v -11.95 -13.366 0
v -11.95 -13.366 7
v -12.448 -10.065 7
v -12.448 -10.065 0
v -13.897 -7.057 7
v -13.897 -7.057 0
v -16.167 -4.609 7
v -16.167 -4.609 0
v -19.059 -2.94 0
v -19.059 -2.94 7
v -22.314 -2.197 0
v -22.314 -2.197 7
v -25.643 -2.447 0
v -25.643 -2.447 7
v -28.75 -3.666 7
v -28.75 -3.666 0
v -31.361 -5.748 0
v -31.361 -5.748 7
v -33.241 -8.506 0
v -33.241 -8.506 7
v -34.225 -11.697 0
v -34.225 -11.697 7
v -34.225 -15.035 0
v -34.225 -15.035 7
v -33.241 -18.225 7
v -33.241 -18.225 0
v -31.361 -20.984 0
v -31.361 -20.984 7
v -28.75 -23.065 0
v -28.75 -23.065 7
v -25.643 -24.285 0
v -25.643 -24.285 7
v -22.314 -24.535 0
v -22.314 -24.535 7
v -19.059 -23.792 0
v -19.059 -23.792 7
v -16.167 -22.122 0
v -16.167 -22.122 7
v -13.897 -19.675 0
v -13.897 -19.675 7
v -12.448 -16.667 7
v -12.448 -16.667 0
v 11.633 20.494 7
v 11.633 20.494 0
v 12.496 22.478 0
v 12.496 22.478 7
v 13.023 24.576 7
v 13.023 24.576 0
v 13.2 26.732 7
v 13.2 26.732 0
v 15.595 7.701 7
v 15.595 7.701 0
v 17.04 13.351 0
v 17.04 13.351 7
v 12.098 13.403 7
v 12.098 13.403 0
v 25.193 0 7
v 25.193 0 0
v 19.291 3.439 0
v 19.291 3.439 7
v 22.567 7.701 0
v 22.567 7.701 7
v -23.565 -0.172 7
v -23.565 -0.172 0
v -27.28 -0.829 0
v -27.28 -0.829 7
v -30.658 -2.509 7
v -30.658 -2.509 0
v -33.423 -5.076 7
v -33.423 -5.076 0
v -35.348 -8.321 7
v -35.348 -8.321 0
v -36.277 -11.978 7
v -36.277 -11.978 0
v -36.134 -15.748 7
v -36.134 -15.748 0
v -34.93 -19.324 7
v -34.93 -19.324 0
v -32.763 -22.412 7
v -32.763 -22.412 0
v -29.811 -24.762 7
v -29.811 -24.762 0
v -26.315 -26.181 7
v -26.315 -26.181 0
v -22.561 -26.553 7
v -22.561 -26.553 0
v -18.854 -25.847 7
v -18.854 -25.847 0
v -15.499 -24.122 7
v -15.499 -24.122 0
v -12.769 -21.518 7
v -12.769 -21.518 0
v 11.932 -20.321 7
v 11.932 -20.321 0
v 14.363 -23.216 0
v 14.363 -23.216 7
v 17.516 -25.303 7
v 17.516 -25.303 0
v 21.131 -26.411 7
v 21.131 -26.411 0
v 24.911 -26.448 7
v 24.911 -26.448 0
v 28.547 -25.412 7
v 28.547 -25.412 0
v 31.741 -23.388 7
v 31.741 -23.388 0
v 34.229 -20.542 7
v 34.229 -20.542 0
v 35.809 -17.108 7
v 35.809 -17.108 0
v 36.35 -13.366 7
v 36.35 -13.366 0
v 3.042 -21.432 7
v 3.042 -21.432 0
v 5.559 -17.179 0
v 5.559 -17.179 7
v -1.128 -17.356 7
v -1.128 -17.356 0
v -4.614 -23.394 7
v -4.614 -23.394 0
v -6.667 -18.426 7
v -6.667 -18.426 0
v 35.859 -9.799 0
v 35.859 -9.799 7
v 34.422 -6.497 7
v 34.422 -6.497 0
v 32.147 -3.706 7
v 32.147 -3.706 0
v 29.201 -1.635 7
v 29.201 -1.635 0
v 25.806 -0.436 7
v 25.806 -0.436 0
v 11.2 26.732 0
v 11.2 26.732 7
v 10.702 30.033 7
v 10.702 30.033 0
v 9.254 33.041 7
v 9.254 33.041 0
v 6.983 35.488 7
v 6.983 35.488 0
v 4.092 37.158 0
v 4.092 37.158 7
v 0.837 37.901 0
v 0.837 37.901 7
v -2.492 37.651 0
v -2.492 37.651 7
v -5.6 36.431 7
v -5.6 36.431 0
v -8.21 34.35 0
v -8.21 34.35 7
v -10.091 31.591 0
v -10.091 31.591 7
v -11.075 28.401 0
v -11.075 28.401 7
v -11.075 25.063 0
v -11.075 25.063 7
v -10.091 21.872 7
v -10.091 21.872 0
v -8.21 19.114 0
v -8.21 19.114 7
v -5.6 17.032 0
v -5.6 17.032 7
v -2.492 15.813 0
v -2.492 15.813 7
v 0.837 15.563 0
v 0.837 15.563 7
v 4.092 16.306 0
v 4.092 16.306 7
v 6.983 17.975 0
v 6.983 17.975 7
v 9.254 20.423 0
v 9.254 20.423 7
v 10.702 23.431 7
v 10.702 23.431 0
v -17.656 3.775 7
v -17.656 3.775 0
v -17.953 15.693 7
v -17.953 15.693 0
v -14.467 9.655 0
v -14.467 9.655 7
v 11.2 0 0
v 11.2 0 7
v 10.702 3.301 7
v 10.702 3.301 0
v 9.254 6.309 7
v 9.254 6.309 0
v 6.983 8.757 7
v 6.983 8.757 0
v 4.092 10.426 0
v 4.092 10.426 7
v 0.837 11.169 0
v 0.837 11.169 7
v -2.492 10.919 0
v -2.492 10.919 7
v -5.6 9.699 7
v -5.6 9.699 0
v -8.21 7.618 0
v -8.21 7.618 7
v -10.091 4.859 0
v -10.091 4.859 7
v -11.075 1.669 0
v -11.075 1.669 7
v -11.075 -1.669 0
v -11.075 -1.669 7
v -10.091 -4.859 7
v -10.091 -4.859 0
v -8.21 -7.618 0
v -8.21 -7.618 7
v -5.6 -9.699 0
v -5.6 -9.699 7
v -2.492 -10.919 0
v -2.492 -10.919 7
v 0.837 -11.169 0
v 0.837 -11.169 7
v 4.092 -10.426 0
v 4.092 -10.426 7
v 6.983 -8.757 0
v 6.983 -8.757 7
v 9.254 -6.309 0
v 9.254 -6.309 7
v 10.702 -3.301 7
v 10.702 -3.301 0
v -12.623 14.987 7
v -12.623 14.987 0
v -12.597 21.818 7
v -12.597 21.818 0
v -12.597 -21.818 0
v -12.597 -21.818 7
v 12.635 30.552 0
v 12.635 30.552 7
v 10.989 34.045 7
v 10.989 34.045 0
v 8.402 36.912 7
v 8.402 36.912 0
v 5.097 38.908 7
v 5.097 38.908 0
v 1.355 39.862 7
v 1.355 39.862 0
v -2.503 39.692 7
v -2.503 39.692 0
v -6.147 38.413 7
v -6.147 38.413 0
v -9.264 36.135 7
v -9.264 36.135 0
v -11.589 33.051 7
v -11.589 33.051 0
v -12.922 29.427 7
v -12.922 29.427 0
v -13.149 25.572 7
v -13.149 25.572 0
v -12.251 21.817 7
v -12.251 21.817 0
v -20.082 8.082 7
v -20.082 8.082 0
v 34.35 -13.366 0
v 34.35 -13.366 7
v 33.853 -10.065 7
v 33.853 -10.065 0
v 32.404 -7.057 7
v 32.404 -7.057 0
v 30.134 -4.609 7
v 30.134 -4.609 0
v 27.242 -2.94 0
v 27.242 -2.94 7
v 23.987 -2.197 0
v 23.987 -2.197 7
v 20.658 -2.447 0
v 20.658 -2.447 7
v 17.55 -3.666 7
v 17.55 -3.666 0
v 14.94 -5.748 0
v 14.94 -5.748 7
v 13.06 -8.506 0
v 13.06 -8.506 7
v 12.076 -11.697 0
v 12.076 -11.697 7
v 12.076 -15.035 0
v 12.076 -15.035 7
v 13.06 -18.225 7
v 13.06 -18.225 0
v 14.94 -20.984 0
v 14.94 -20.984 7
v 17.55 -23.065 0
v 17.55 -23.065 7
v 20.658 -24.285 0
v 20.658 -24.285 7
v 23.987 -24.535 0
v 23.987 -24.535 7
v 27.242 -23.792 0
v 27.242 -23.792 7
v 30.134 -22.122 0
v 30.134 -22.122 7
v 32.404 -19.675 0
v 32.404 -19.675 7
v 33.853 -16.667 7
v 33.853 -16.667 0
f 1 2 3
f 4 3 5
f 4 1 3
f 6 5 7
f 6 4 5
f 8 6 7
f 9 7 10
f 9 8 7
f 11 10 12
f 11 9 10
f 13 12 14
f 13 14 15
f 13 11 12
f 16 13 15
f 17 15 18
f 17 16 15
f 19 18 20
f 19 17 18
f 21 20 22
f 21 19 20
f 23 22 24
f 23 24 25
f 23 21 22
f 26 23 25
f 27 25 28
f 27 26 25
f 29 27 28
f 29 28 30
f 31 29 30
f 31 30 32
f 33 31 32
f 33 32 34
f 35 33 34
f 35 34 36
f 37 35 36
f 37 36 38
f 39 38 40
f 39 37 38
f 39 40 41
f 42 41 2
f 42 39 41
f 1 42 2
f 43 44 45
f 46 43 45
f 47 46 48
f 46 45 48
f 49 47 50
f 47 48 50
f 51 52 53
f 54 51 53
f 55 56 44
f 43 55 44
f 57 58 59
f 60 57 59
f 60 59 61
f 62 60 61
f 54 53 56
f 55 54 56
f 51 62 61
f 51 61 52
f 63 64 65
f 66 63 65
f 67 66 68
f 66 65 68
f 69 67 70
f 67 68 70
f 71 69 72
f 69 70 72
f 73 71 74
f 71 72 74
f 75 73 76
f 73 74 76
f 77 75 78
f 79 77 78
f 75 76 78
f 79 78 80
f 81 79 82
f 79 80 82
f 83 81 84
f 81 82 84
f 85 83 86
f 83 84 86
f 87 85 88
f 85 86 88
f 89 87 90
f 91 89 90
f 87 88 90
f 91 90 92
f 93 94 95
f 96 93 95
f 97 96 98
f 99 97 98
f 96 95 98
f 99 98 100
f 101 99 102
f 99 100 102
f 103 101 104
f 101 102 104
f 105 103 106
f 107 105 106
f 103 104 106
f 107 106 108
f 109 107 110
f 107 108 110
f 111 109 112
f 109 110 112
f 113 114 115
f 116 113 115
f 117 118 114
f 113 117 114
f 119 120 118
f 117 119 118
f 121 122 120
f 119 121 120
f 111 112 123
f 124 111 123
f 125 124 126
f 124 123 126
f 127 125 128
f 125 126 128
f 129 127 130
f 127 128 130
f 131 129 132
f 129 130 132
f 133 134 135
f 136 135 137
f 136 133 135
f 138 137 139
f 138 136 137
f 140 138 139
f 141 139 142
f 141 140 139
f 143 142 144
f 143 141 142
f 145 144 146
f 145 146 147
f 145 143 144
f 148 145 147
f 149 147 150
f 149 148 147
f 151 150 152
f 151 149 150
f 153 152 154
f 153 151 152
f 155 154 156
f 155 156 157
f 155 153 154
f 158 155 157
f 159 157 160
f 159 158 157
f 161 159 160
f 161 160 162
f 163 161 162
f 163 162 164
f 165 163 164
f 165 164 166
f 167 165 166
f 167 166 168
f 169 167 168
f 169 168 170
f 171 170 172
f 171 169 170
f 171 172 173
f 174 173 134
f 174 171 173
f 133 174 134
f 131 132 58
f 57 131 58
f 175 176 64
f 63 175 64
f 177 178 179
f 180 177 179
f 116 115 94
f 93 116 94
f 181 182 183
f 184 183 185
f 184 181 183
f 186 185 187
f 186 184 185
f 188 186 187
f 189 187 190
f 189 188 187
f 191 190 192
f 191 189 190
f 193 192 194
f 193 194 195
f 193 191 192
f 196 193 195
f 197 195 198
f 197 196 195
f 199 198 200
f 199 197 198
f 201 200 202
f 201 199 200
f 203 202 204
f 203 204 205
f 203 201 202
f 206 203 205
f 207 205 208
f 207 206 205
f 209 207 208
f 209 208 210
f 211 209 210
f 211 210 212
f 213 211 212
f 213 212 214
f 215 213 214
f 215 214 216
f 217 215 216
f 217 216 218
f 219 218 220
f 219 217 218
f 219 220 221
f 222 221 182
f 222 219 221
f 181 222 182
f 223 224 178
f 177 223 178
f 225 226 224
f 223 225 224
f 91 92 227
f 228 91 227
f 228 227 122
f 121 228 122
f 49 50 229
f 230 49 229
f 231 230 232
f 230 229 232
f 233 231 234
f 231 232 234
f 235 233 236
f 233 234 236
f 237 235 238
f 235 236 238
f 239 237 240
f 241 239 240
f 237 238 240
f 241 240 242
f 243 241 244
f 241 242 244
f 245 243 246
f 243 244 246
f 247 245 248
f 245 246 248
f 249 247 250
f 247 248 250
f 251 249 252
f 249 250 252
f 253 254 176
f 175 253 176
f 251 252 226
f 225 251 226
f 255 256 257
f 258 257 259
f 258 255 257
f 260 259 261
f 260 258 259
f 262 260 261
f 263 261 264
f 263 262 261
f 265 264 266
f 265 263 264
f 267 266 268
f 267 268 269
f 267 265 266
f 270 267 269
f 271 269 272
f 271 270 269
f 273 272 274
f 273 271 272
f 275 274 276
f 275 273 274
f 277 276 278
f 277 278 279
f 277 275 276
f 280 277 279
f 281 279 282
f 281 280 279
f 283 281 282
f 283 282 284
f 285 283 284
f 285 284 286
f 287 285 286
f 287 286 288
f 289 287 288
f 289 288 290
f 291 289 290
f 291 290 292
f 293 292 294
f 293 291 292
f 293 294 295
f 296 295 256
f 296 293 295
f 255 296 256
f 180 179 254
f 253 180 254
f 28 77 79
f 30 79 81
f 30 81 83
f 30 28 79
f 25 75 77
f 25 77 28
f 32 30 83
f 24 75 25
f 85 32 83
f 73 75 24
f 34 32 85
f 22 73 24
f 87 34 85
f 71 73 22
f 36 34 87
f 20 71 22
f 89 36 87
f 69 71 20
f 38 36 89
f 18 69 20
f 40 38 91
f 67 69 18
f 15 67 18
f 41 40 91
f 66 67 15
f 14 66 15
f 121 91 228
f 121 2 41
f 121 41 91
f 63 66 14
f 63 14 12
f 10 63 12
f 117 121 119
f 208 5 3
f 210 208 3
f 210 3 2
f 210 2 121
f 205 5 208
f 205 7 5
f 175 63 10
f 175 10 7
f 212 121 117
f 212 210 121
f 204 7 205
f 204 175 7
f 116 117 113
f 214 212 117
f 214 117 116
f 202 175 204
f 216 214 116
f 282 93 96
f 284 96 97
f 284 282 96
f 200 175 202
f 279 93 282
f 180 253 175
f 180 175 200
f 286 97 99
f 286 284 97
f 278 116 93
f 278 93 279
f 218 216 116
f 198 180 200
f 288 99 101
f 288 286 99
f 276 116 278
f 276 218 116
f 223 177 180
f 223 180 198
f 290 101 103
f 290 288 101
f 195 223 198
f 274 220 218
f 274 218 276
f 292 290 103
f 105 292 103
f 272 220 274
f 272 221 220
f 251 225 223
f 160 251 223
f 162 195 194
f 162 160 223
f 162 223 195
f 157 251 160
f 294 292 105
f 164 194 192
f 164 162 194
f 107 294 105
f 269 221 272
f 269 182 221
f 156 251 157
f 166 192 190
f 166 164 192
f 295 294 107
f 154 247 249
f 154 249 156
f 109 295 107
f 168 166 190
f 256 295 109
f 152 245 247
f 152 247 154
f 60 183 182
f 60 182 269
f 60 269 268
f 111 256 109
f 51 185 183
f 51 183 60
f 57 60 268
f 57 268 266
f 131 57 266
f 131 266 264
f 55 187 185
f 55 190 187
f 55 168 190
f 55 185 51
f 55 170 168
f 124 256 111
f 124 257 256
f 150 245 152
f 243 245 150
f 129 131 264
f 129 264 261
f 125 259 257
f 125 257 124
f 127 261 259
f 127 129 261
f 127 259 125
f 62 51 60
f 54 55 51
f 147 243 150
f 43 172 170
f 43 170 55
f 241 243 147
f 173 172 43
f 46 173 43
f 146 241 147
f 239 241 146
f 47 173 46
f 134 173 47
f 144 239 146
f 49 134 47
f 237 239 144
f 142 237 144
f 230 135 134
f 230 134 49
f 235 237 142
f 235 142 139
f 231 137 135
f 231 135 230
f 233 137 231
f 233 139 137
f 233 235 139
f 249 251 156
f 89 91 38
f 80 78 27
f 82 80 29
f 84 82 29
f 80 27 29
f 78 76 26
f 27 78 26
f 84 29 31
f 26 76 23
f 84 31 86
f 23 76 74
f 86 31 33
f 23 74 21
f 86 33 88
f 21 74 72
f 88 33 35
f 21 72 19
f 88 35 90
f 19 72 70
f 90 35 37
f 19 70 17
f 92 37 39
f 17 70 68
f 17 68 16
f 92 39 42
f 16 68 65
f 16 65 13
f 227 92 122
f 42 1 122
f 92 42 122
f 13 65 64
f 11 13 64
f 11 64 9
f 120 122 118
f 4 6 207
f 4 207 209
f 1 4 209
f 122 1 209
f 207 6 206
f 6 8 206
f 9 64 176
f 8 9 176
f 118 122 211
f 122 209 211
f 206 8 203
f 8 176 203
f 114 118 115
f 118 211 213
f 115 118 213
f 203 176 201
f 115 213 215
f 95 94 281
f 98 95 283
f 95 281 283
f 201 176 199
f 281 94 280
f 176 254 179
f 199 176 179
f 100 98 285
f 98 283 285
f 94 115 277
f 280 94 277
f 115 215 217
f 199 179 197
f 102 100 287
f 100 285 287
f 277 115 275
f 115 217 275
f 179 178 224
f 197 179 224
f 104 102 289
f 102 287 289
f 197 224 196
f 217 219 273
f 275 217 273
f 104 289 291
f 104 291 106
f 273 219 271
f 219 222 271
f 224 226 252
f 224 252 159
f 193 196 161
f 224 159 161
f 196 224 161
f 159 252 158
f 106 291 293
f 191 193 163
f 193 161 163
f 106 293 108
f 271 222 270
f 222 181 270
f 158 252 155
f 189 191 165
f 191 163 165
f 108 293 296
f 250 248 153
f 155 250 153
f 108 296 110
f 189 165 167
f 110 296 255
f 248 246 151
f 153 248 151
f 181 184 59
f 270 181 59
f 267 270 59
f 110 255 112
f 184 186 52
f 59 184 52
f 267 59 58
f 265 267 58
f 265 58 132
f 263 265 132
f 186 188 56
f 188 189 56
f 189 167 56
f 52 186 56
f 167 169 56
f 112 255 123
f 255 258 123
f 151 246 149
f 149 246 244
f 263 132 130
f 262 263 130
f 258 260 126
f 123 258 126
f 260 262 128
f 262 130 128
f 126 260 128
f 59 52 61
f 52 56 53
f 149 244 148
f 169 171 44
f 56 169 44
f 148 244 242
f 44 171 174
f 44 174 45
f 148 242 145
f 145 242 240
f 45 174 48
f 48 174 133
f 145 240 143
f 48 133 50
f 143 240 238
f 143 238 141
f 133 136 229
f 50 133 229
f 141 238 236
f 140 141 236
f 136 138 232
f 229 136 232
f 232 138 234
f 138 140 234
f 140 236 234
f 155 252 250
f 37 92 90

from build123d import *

# Parameters (mm, degrees)
F0_R     = 13.2
F0_R_2   = 11.2
F1_DEPTH = 7


with BuildPart() as f1:
    # F0 (on Top) → F1 (new body)
    with BuildSketch(Plane.XY):
        with BuildLine():
            ThreePointArc((11.632991, 20.493819), (-0.73006, 13.552093), (-12.250791, 21.816798))
            Line((-12.250791, 21.816798), (-12.596717, 21.818154))
            Line((-12.596717, 21.818154), (-12.623499, 14.987107))
            Line((-12.623499, 14.987107), (-17.952998, 15.692942))
            Line((-17.952998, 15.692942), (-14.466907, 9.654855))
            Line((-14.466907, 9.654855), (-20.082159, 8.081509))
            Line((-20.082159, 8.081509), (-17.656412, 3.77544))
            Line((-17.656412, 3.77544), (-23.564664, -0.172444))
            ThreePointArc((-23.564664, -0.172444), (-13.964283, -3.886835), (-9.950495, -13.365945))
            ThreePointArc((-9.950495, -13.365945), (-10.674874, -17.678585), (-12.768506, -21.517895))
            Line((-12.768506, -21.517895), (-12.596717, -21.818154))
            Line((-12.596717, -21.818154), (-6.667466, -18.425824))
            Line((-6.667466, -18.425824), (-4.613987, -23.394224))
            Line((-4.613987, -23.394224), (-1.127896, -17.356137))
            Line((-1.127896, -17.356137), (3.042287, -21.432415))
            Line((3.042287, -21.432415), (5.558579, -17.178622))
            Line((5.558579, -17.178622), (11.931673, -20.321376))
            ThreePointArc((11.931673, -20.321376), (12.324979, -5.812918), (25.805954, -0.435804))
            Line((25.805954, -0.435804), (25.193434, 0))
            Line((25.193434, 0), (19.290965, 3.438717))
            Line((19.290965, 3.438717), (22.566986, 7.701282))
            Line((22.566986, 7.701282), (15.594803, 7.701282))
            Line((15.594803, 7.701282), (17.039872, 13.350905))
            Line((17.039872, 13.350905), (12.097833, 13.403182))
            Line((12.097833, 13.403182), (11.632991, 20.493819))
        make_face()
        Circle(F0_R, mode=Mode.SUBTRACT)
        Circle(F0_R)
        Circle(F0_R_2, mode=Mode.SUBTRACT)
        with BuildLine():
            ThreePointArc((36.350495, -13.365945), (33.380159, -5.023644), (25.805954, -0.435804))
            ThreePointArc((25.805954, -0.435804), (12.324979, -5.812918), (11.931673, -20.321376))
            ThreePointArc((11.931673, -20.321376), (26.766539, -26.060992), (36.350495, -13.365945))
        make_face()
        with Locations((23.150495, -13.365945)):
            Circle(F0_R_2, mode=Mode.SUBTRACT)
        with BuildLine():
            ThreePointArc((-9.950495, -13.365945), (-13.964283, -3.886835), (-23.564664, -0.172444))
            ThreePointArc((-23.564664, -0.172444), (-34.929563, -19.323592), (-12.768506, -21.517895))
            ThreePointArc((-12.768506, -21.517895), (-10.674874, -17.678585), (-9.950495, -13.365945))
        make_face()
        with Locations((-23.150495, -13.365945)):
            Circle(F0_R_2, mode=Mode.SUBTRACT)
        with BuildLine():
            ThreePointArc((11.632991, 20.493819), (12.802255, 23.515951), (13.2, 26.731889))
            ThreePointArc((13.2, 26.731889), (-2.502954, 39.692414), (-12.250791, 21.816798))
            ThreePointArc((-12.250791, 21.816798), (-0.73006, 13.552093), (11.632991, 20.493819))
        make_face()
        with Locations((0, 26.731889)):
            Circle(F0_R_2, mode=Mode.SUBTRACT)
    extrude(amount=F1_DEPTH)


solid = f1.part
